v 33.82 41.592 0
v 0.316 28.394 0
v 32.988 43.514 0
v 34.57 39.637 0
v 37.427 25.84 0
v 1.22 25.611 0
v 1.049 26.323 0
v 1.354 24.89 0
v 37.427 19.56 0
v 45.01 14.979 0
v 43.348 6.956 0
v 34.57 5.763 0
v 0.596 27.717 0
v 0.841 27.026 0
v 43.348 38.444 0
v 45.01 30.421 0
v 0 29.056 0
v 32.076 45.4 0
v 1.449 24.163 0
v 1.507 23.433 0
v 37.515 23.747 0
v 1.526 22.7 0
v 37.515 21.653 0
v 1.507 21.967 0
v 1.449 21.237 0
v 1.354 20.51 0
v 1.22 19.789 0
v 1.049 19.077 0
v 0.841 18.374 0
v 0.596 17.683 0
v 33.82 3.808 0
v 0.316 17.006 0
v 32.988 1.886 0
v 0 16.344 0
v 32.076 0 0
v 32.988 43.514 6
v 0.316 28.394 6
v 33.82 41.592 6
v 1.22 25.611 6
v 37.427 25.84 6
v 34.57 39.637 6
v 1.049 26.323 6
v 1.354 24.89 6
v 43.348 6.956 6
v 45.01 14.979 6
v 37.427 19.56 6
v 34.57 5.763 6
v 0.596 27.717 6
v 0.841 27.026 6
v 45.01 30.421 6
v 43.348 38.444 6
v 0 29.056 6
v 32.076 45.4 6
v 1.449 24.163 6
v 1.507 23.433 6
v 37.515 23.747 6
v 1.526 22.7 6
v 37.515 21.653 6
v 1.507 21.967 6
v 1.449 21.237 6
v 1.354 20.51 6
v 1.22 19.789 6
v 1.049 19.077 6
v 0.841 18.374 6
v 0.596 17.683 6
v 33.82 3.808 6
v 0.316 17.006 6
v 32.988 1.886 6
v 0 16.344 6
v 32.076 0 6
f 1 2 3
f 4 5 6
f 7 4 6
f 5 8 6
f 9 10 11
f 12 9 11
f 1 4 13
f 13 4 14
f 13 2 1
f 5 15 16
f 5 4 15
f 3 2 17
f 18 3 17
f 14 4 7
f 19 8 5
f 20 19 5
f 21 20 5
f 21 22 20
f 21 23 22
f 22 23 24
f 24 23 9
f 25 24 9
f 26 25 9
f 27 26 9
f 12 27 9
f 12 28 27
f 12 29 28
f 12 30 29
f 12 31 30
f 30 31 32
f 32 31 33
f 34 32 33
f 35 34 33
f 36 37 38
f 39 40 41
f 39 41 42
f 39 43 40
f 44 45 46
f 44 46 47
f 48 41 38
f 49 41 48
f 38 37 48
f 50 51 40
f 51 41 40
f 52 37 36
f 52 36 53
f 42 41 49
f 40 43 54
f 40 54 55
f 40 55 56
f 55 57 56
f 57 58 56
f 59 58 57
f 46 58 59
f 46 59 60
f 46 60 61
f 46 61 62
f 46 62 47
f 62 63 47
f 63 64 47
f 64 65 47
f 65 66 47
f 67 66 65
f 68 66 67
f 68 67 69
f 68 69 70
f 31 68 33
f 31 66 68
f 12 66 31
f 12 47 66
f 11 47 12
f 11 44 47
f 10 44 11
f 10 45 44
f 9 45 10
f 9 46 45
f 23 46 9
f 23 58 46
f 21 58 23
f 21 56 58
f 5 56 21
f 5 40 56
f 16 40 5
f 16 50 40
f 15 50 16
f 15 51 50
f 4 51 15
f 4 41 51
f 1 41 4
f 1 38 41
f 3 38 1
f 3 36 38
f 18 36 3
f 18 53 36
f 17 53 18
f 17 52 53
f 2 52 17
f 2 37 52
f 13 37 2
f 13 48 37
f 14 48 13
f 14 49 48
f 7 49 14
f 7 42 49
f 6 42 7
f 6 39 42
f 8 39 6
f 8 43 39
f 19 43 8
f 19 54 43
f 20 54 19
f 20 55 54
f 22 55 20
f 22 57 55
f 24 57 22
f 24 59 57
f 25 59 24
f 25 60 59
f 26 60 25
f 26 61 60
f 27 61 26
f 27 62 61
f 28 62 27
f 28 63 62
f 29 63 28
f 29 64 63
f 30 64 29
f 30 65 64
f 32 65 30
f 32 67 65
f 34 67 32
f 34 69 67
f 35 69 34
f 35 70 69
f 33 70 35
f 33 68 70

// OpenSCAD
$fn = 32;

// ----------------------------------------------------------------------
// Gear sector: 2 teeth on 54 degrees
// ----------------------------------------------------------------------

// --- parameters (mm) ---
sector_angle = 54;        // sector angle, degrees
root_r = 50;              // root circle radius
tooth_h = 8;              // tooth height over the root circle
teeth = 2;                // number of teeth on the sector
hub_r = 14;               // hub bore radius
plate_t = 6;              // sector thickness, Z
arc_step = 3;             // sampling step of the root/hub arcs, degrees

tip_r = root_r + tooth_h;  // tip circle radius

profile = [[32.076, 0], [32.988, 1.886], [33.82, 3.808], [34.57, 5.763], [43.348, 6.956], [45.01, 14.979], [37.427, 19.56], [37.515, 21.653], [37.515, 23.747], [37.427, 25.84], [45.01, 30.421], [43.348, 38.444], [34.57, 39.637], [33.82, 41.592], [32.988, 43.514], [32.076, 45.4], [0, 29.056], [0.316, 28.394], [0.596, 27.717], [0.841, 27.026], [1.049, 26.323], [1.22, 25.611], [1.354, 24.89], [1.449, 24.163], [1.507, 23.433], [1.526, 22.7], [1.507, 21.967], [1.449, 21.237], [1.354, 20.51], [1.22, 19.789], [1.049, 19.077], [0.841, 18.374], [0.596, 17.683], [0.316, 17.006], [0, 16.344]];  // primary outline, 35 points, counter clockwise

// --- the one profile operation ---
linear_extrude(height = plate_t) polygon(points = profile);
